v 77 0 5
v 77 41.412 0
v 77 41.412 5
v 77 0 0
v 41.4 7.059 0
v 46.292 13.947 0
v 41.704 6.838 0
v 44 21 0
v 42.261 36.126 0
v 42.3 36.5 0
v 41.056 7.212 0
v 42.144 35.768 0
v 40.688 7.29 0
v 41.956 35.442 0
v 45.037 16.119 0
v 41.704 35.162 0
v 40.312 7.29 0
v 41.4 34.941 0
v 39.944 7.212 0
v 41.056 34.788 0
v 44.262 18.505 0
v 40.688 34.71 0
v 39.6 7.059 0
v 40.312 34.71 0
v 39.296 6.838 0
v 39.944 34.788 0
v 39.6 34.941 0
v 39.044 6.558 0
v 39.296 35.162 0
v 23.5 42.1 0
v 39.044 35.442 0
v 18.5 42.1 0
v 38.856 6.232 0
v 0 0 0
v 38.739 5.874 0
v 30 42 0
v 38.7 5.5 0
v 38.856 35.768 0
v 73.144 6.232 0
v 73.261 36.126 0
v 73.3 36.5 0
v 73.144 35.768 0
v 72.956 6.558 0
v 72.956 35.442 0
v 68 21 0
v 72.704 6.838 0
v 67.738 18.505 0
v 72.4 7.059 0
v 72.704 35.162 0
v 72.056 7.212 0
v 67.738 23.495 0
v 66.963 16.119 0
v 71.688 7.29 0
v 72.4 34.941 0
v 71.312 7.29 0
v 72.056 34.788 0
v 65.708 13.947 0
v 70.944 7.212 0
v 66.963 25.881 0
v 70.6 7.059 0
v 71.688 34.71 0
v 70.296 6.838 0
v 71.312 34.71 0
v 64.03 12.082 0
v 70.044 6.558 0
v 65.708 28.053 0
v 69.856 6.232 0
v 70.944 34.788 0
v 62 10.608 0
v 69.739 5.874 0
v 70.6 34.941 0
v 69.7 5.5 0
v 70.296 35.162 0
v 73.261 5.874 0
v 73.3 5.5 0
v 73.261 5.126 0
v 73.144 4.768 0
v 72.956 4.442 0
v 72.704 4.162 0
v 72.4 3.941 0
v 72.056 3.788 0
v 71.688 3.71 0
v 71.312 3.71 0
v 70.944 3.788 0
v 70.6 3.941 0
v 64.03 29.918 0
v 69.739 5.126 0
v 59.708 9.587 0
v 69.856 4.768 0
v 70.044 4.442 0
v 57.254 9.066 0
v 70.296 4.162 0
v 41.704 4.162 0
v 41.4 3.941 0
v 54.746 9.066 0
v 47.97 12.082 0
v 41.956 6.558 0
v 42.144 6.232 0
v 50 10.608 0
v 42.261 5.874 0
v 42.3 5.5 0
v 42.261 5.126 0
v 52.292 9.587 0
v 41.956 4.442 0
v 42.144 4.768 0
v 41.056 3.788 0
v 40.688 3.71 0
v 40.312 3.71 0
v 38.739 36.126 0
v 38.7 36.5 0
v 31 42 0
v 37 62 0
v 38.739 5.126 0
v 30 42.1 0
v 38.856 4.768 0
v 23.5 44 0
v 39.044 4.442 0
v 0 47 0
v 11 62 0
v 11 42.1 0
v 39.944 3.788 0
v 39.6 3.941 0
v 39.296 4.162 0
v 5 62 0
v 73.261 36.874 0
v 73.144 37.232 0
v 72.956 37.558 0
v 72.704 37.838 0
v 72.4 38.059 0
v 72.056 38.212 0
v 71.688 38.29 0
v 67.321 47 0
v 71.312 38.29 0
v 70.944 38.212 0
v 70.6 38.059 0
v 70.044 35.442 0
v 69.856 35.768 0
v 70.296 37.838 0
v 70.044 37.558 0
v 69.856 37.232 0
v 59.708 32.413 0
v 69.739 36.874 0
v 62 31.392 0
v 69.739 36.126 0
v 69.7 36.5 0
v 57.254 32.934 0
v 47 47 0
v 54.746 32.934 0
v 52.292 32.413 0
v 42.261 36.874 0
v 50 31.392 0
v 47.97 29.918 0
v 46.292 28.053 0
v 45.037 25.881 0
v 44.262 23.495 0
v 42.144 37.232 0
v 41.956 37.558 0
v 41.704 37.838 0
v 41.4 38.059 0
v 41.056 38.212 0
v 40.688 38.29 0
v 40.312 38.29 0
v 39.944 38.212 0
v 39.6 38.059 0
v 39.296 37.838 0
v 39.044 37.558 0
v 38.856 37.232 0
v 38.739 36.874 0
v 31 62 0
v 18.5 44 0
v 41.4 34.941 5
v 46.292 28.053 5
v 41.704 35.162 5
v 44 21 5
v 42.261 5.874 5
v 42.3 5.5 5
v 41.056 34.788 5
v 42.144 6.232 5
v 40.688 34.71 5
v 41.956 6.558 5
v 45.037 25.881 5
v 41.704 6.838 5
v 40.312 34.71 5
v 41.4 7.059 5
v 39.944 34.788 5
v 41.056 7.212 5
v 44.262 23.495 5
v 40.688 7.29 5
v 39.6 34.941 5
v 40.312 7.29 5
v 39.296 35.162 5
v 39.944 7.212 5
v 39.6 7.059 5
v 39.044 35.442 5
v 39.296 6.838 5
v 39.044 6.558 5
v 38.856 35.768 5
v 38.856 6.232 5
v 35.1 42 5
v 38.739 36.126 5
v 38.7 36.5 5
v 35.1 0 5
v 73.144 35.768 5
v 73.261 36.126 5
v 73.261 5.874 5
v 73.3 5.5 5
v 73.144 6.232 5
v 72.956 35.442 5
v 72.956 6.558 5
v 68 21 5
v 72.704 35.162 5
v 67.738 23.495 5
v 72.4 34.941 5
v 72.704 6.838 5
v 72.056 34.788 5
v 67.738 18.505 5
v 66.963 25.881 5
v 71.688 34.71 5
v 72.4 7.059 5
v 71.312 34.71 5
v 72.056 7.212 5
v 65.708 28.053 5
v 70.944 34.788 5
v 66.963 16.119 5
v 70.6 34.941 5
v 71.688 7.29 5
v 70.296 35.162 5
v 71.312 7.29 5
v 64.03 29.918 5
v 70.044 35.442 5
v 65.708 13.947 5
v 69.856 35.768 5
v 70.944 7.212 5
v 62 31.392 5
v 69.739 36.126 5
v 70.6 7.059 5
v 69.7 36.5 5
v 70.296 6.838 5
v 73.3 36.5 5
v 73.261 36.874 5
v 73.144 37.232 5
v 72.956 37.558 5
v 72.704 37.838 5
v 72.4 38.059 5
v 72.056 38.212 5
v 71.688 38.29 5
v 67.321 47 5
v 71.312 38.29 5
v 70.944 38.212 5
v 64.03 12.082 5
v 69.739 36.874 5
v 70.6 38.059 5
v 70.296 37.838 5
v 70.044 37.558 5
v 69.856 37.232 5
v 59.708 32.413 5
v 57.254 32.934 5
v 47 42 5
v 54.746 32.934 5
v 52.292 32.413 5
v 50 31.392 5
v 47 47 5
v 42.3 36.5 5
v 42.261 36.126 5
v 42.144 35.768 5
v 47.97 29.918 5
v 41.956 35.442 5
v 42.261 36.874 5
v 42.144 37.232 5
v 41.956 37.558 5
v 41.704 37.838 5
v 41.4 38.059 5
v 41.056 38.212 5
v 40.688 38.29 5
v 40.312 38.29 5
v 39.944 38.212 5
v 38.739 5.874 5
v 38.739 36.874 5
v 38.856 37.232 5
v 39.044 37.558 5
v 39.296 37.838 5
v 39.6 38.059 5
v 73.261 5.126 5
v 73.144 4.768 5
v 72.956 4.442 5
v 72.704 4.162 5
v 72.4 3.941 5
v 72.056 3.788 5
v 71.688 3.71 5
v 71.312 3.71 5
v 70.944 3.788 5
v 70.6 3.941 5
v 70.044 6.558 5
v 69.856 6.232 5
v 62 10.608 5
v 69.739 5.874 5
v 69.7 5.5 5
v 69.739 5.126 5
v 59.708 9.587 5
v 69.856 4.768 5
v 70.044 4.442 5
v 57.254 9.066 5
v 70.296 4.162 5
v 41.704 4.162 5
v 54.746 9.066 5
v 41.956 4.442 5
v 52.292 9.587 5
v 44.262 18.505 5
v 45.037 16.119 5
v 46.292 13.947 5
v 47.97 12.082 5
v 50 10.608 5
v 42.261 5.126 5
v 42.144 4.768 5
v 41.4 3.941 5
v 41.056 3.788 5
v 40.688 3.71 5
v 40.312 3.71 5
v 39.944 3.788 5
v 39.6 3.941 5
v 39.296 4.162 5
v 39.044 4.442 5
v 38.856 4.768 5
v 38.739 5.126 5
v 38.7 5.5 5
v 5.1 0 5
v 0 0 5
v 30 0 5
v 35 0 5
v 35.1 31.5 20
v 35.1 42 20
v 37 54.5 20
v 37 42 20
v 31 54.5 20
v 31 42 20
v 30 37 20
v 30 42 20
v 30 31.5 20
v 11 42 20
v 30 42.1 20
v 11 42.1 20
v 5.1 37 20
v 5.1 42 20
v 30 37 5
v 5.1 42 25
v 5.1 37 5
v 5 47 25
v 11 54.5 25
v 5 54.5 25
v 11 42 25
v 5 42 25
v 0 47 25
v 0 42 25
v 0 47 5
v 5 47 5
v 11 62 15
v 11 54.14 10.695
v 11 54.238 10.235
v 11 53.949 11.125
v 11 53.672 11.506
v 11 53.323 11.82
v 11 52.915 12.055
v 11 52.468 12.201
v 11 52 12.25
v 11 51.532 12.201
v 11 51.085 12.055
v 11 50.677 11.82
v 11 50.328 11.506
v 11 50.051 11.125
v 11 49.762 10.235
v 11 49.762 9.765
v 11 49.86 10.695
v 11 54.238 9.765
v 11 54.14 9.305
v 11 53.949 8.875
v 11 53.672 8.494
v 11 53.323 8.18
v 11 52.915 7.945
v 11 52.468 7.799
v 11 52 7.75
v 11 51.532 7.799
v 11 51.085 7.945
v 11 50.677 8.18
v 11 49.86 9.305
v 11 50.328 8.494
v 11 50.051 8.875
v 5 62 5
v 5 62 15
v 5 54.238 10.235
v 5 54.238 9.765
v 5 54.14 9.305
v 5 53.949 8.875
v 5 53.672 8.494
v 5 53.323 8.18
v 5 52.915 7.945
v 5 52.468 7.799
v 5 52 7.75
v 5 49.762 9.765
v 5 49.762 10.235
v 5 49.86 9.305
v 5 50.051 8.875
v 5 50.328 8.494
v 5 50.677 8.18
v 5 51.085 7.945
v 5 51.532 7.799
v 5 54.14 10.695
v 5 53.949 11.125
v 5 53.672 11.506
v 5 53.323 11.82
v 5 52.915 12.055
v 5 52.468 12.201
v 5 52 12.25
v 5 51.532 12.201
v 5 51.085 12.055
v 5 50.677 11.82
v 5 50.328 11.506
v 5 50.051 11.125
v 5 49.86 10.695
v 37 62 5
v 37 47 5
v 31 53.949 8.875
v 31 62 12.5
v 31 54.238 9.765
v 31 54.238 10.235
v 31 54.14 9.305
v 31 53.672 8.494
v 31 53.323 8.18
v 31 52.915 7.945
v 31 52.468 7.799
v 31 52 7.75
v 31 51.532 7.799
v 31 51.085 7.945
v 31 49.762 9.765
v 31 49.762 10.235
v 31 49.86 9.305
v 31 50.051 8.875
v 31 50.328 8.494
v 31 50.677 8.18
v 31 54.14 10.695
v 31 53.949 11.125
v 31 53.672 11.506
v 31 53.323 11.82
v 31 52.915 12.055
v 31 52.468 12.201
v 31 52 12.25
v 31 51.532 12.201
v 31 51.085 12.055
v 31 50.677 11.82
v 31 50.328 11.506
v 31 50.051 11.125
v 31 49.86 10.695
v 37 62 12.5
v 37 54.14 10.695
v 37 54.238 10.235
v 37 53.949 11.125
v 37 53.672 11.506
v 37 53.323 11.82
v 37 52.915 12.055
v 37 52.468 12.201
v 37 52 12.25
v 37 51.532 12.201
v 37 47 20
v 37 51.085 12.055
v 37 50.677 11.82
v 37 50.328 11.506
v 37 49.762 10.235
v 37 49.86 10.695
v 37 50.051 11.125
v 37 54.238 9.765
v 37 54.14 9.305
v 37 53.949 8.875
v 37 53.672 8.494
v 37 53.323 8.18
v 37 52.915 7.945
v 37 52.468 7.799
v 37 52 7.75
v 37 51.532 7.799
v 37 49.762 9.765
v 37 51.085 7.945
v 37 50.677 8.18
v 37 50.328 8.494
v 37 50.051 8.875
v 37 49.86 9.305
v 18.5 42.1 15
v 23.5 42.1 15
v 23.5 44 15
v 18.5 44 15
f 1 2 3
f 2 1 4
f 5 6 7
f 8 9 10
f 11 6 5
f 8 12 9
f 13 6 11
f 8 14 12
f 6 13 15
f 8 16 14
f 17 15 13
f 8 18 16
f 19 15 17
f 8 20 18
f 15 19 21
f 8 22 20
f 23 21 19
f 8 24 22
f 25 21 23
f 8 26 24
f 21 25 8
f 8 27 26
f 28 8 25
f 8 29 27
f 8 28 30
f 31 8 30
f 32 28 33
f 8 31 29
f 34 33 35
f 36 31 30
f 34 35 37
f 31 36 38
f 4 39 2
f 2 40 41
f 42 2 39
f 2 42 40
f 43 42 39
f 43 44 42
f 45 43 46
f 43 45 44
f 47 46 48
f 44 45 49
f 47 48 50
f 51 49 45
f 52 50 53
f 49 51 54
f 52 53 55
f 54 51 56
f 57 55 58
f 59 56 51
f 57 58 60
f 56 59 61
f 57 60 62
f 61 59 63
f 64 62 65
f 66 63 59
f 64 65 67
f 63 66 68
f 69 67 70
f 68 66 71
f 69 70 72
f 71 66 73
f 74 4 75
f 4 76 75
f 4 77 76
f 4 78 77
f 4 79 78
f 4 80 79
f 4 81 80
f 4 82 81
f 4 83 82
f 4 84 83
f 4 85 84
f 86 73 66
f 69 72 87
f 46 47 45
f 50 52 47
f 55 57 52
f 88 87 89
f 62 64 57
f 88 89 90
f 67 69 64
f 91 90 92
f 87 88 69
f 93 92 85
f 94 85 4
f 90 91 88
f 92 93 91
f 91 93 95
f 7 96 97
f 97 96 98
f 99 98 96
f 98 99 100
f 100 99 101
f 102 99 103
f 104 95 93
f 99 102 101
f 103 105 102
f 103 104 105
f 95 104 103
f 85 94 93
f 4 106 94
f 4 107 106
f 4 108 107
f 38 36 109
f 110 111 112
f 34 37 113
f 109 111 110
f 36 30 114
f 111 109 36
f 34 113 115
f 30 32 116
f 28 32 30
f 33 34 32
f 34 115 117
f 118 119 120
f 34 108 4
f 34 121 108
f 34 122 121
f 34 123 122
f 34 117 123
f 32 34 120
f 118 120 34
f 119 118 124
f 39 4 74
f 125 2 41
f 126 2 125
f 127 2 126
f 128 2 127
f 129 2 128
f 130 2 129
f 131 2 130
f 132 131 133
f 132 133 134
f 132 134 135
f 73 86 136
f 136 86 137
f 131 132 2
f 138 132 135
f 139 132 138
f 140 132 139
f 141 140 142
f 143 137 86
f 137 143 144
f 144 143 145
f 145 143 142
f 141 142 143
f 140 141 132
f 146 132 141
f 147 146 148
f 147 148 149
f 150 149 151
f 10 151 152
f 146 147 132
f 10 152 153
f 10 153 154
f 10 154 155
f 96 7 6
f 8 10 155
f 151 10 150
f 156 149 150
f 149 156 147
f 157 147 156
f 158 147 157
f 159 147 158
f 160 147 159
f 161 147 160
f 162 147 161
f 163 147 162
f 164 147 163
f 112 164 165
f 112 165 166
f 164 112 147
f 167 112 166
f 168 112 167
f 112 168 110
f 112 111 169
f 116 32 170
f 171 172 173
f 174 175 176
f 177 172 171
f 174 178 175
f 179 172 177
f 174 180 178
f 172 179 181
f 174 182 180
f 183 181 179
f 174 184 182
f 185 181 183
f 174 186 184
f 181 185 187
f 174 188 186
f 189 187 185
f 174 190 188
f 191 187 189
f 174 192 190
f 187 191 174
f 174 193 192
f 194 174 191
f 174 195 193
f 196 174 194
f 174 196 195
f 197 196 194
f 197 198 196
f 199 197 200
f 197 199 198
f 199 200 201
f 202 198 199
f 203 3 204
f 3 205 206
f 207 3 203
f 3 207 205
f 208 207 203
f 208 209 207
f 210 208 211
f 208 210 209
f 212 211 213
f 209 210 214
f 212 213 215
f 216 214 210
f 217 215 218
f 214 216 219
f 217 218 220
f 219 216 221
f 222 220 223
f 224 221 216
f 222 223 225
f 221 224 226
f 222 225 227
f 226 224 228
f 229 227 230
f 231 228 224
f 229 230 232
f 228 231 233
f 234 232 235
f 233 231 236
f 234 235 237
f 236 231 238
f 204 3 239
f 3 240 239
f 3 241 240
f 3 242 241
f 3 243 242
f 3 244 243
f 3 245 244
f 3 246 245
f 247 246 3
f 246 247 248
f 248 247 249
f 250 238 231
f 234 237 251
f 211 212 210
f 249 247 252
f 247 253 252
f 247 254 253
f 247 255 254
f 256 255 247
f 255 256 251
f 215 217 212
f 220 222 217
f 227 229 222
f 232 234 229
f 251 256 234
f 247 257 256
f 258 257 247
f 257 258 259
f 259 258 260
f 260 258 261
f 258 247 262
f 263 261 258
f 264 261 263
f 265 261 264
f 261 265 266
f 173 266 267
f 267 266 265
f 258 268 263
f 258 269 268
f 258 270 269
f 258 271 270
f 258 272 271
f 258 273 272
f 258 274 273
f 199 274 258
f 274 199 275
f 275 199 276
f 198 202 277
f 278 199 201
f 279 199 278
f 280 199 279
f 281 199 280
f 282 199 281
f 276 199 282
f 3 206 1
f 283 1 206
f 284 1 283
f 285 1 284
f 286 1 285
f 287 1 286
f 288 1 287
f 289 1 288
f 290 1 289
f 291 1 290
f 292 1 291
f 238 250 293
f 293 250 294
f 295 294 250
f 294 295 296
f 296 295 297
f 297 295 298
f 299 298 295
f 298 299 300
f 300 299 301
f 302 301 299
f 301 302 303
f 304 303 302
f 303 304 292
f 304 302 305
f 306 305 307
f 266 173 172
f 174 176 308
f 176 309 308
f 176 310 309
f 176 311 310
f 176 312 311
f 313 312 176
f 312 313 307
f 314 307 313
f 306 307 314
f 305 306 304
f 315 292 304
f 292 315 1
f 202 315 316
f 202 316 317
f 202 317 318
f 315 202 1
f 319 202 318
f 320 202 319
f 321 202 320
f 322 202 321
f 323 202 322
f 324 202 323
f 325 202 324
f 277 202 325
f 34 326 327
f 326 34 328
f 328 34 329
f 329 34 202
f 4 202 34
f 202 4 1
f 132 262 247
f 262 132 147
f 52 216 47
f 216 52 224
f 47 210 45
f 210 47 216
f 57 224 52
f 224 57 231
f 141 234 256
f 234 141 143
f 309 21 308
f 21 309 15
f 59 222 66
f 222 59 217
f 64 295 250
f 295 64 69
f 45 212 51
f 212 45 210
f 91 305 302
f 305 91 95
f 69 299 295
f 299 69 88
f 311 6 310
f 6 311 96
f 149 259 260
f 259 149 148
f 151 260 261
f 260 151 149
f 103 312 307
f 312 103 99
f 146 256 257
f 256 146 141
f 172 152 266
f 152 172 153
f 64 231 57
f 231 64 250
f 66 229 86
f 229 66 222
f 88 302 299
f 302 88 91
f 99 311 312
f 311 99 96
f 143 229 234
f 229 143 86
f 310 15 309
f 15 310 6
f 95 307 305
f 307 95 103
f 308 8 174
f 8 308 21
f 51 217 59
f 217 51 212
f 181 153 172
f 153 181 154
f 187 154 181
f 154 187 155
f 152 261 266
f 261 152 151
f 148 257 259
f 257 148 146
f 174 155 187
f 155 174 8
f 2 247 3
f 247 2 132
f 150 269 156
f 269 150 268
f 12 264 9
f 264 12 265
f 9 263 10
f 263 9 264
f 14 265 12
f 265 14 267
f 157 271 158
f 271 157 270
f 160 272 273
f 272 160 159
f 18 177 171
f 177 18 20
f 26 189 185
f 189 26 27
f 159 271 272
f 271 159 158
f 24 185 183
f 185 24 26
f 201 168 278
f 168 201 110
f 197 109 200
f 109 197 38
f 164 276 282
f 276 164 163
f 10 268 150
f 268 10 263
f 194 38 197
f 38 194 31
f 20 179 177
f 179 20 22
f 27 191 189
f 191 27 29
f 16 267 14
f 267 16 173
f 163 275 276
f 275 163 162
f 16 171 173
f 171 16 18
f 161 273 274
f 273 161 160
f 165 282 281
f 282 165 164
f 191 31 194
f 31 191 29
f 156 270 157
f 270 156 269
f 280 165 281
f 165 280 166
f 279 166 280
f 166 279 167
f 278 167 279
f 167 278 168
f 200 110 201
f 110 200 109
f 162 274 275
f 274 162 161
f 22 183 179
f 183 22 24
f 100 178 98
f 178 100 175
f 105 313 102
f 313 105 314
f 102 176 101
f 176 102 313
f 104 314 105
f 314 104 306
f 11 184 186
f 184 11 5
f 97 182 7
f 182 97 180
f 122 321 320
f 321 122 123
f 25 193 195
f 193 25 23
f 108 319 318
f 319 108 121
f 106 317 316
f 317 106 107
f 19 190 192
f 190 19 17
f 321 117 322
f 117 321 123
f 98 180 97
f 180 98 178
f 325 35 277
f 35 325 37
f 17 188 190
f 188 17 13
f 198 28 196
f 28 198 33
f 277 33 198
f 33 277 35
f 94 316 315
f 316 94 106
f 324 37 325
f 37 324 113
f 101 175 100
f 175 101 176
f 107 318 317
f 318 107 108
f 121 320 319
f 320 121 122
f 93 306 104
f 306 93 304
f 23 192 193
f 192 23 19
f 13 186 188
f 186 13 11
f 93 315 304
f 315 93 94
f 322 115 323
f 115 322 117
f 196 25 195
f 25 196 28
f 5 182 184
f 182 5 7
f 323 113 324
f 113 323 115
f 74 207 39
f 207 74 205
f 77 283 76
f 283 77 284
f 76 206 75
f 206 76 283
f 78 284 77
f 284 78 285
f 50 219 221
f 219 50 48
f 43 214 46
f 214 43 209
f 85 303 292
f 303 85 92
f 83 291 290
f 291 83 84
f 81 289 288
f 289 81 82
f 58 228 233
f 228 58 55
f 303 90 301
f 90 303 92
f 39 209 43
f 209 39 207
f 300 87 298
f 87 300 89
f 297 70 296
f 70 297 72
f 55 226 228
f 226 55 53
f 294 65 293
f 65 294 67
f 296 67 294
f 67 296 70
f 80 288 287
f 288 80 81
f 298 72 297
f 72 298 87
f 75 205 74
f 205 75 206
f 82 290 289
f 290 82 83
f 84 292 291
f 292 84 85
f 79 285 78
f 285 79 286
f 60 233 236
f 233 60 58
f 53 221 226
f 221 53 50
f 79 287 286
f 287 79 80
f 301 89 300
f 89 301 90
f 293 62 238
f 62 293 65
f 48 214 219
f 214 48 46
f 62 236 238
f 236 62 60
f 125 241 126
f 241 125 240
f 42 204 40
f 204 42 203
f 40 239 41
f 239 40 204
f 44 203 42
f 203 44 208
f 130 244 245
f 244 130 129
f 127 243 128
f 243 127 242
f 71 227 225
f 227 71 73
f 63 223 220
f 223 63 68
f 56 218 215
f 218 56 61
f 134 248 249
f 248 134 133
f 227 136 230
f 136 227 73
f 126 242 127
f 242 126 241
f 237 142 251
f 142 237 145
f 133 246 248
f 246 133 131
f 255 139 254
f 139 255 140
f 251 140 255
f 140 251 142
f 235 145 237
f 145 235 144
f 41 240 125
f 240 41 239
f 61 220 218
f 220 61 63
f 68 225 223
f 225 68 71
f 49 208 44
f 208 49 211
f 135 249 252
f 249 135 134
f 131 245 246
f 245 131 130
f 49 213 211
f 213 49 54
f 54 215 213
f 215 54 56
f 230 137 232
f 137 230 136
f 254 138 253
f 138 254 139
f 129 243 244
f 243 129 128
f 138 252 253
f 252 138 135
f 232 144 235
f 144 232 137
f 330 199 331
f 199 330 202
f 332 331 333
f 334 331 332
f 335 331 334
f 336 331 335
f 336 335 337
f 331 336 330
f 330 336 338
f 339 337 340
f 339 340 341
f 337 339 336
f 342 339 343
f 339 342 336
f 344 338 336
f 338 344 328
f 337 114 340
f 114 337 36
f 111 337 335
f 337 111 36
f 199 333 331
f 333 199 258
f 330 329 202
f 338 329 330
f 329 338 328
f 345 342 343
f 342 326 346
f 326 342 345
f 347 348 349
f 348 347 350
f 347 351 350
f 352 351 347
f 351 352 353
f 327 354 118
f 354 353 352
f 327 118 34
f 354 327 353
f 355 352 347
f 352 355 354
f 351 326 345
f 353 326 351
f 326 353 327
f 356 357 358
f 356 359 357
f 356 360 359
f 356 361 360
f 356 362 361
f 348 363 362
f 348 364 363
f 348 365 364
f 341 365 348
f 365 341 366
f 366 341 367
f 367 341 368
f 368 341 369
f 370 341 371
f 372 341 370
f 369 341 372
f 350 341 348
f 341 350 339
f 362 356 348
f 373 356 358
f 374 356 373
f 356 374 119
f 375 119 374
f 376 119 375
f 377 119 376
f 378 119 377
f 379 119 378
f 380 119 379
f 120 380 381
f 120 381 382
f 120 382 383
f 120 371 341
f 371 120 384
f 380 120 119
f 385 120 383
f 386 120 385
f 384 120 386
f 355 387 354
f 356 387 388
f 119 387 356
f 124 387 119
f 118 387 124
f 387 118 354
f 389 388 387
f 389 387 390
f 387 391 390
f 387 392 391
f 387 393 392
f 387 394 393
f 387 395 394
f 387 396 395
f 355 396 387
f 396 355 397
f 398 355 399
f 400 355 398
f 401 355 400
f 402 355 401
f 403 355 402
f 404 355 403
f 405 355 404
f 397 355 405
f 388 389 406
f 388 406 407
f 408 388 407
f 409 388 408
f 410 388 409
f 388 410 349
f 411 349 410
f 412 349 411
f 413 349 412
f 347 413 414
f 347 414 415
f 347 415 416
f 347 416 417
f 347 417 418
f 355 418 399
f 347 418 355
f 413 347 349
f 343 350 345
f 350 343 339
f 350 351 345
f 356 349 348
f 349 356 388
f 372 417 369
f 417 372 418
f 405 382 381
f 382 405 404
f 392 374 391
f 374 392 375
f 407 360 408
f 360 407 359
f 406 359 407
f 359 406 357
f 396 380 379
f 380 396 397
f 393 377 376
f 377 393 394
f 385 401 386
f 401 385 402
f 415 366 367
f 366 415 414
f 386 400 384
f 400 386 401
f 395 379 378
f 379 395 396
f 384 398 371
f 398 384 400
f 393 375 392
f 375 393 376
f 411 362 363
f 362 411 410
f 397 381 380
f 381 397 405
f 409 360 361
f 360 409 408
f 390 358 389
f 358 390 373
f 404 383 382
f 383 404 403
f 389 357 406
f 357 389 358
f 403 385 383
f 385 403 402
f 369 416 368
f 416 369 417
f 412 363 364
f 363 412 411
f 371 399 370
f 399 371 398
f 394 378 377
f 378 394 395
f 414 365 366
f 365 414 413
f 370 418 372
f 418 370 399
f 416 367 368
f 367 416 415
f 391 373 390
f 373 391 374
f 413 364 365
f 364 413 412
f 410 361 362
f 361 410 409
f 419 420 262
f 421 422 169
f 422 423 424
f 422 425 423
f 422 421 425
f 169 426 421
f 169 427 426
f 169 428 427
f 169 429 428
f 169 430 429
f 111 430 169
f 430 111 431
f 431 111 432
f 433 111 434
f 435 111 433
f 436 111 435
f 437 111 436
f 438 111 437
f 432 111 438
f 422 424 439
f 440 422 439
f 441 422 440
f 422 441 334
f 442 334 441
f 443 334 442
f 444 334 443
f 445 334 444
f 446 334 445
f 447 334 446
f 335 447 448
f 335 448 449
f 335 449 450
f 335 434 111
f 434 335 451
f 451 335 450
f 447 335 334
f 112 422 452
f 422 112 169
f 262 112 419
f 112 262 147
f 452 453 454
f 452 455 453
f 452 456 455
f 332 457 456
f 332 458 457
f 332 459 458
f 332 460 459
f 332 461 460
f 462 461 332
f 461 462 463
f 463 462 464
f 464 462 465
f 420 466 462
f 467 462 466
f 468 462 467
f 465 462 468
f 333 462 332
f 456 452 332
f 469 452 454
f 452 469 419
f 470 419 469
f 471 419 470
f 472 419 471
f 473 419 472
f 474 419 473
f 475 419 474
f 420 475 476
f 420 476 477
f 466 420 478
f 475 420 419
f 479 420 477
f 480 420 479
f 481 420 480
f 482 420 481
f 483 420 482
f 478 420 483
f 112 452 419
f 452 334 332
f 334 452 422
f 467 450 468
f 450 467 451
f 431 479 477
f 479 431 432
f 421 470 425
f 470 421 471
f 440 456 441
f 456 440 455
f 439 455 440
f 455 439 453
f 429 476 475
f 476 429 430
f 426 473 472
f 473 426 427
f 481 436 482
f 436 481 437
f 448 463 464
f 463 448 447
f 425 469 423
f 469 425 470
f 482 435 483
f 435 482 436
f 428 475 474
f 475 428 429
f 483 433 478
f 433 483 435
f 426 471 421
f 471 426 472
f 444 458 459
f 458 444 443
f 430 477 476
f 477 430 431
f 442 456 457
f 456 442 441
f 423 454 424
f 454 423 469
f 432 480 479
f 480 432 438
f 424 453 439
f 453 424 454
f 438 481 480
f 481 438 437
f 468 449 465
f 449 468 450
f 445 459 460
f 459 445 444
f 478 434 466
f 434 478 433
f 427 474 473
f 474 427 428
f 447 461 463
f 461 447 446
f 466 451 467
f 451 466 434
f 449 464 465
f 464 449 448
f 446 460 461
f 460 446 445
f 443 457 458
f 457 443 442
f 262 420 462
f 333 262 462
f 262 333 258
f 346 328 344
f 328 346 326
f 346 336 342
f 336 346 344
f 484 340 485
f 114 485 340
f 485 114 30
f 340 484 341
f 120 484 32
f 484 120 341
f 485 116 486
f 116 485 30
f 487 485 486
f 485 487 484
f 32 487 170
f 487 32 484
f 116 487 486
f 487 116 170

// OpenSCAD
// file: metric.scad
// PRUSA Mendel  
// Default metric sizes
// GNU GPL v2
// Josef Průša
// josefprusa@me.com
// prusadjs.cz
// http://www.reprap.org/wiki/Prusa_Mendel
// http://github.com/prusajr/PrusaMendel

// DONT CHANGE THIS FILE! ALTER VALUES IN CONFIGURATION.SCAD INSTEAD

// RODS

threaded_rod_diameter = 8.2;
threaded_rod_diameter_horizontal = 8.2;
smooth_bar_diameter = 8;
smooth_bar_diameter_horizontal = 8.5;

// Nuts and bolts

m8_diameter = 9;
m8_nut_diameter = 16.4;

m4_diameter = 4.5;
m4_nut_diameter = 9;

m3_diameter = 3.6;
m3_nut_diameter = 6.1;

// Bushing holder

bushing_core_diameter = smooth_bar_diameter;
bushing_material_thickness = 1;

// Motors

motor_shaft = 5.5;
// main file
// C. Strang		
// cstrang@????
// funfor.us

h = 5;   	// base thickness
hh=6;
o = 0.1;	//  overlap amount
w=2.5;			// wall thickness
fmp = true;	// four mount points
st=2;

include <metric.scad>;

m3=m3_diameter ; 
m4=m4_diameter ; 
m8=smooth_bar_diameter_horizontal;

$fn=30;

translate([0,0,0]) ymotormount();

module ymotormount()
{
	translate([5 + 30, 42, 5]) rotate([180, 0, 0]) nema17motormount(h,fmp);
	translate([0,0,0]) rotate([0,0,0]) walls();
}


module nema17motormount(pt, mp)
{
	difference()
	{
		union()
		{
			difference()
			{
				translate([0, -5, 0]) rotate([0,0,0]) cube([42, 47, pt]);
		
				translate([21,21,-0.1]) cylinder(r=12,h=pt+2*o);
				if (mp==false)
				{
					translate([28,-0.1,-o])  cube([25,30,21]);
					translate([3,-0.1,-o])  cube([36,15,21]);
				} else {
					translate([55, -15, -o]) rotate([0, 0, 120]) cube([20, 20, 10]);
				}
		
			}
			
			if (mp==false) difference()
			{
				translate([35.6,32.6,0]) cylinder(r=7.3,h=pt);
				translate([42,28,-o]) cube([5,10,pt+2*o]);
				translate([28,30,-o]) cube([17,10,pt+2*o]);
			}
		
			if (mp==false) translate([1,0,0]) difference()
			{
				translate([2.6,9.3,0]) cylinder(r=9.3,h=pt);
				translate([-8,0,-o]) cube([7,20,pt+2*o]);
			}
		}
		translate([5.5,5.5,-o]) cylinder(r=m3/2,h=pt+2*o);
		translate([5.5,36.5,-o]) cylinder(r=m3/2,h=pt+2*o);
		translate([36.5,36.5,-o]) cylinder(r=m3/2,h=pt+2*o);
		if (mp==true)
		{
			translate([36.5,5.5,-o]) cylinder(r=m3/2,h=pt+2*o);
	
		}
	}
}


module walls()
{
	// fill-in space between bottom wall and nema mount
	translate([0,0,0]) rotate([0,0,0]) cube([30, 42, 5]);
	// nema mount wall
	difference()
	{
			translate([30, 0, 0]) rotate([0,0,0]) cube([h+o, 42, 20]);
			translate([-o + 30, 0, h]) rotate([atan(20/42),0,0]) cube([h+3*o, 47, 25]);
	}
	// support between bottom and nema mount walls
	translate([30, 37, 0]) rotate([0, 0, 90]) cube([h+o,25,20]);
	// bottom wall
	difference()
	{
			translate([0,0,0]) rotate([0,0,0]) cube([h+o,47,25]);
			translate([-o,0,h]) rotate([atan(20/42),0,0]) cube([h+3*o,47,25]);
	}
	// ?
	difference()
	{
			translate([0,42,0]) rotate([0,0,0]) cube([11,20,h]);
			translate([0,47,-o]) rotate([0,0,-atan(5/15)]) mirror([1,0,0]) cube([10,20,h+3*o]);
	}
	// extrusion wall
	difference()
	{
			translate([h,42,0]) rotate([0,0,0]) cube([hh,20,25]);
			translate([h-o,62,15]) rotate([atan(7.5/10),0,0]) cube([hh+2*o,20,25]);
			translate([h-o,52,10]) rotate([0,90,0]) cylinder(r=m4/2,h=hh+2*o);
	}
	// extrusion wall support
	difference()
	{
			translate([31,42,0]) rotate([0,0,0]) cube([16,20,h]);
			translate([47,47,-o]) rotate([0,0,atan(10/15)]) mirror([0,0,0]) cube([10,20,h+3*o]);
	}
	// extrusion wall
	difference()
	{
			translate([31,42,0]) rotate([0,0,0]) cube([hh,20,20]);
			translate([31-o,62,12.5]) rotate([atan(7.5/7.5),0,0]) cube([hh+2*o,20,25]);
			translate([31-o,52,10]) rotate([0,90,0]) cylinder(r=m4/2,h=hh+2*o);
	}
	// extrusion wall support
	difference()
	{
			translate([31,42,0]) rotate([0,0,0]) cube([16,h,20]);
			translate([47,42-o,h]) rotate([0,-atan(10/15),0]) mirror([0,0,0]) cube([16,h+3*o,20]);
	}
	// t-slot guide
	translate([18.5,42,0]) rotate([0,0,0]) cube([5, st, h + 10]);
}
